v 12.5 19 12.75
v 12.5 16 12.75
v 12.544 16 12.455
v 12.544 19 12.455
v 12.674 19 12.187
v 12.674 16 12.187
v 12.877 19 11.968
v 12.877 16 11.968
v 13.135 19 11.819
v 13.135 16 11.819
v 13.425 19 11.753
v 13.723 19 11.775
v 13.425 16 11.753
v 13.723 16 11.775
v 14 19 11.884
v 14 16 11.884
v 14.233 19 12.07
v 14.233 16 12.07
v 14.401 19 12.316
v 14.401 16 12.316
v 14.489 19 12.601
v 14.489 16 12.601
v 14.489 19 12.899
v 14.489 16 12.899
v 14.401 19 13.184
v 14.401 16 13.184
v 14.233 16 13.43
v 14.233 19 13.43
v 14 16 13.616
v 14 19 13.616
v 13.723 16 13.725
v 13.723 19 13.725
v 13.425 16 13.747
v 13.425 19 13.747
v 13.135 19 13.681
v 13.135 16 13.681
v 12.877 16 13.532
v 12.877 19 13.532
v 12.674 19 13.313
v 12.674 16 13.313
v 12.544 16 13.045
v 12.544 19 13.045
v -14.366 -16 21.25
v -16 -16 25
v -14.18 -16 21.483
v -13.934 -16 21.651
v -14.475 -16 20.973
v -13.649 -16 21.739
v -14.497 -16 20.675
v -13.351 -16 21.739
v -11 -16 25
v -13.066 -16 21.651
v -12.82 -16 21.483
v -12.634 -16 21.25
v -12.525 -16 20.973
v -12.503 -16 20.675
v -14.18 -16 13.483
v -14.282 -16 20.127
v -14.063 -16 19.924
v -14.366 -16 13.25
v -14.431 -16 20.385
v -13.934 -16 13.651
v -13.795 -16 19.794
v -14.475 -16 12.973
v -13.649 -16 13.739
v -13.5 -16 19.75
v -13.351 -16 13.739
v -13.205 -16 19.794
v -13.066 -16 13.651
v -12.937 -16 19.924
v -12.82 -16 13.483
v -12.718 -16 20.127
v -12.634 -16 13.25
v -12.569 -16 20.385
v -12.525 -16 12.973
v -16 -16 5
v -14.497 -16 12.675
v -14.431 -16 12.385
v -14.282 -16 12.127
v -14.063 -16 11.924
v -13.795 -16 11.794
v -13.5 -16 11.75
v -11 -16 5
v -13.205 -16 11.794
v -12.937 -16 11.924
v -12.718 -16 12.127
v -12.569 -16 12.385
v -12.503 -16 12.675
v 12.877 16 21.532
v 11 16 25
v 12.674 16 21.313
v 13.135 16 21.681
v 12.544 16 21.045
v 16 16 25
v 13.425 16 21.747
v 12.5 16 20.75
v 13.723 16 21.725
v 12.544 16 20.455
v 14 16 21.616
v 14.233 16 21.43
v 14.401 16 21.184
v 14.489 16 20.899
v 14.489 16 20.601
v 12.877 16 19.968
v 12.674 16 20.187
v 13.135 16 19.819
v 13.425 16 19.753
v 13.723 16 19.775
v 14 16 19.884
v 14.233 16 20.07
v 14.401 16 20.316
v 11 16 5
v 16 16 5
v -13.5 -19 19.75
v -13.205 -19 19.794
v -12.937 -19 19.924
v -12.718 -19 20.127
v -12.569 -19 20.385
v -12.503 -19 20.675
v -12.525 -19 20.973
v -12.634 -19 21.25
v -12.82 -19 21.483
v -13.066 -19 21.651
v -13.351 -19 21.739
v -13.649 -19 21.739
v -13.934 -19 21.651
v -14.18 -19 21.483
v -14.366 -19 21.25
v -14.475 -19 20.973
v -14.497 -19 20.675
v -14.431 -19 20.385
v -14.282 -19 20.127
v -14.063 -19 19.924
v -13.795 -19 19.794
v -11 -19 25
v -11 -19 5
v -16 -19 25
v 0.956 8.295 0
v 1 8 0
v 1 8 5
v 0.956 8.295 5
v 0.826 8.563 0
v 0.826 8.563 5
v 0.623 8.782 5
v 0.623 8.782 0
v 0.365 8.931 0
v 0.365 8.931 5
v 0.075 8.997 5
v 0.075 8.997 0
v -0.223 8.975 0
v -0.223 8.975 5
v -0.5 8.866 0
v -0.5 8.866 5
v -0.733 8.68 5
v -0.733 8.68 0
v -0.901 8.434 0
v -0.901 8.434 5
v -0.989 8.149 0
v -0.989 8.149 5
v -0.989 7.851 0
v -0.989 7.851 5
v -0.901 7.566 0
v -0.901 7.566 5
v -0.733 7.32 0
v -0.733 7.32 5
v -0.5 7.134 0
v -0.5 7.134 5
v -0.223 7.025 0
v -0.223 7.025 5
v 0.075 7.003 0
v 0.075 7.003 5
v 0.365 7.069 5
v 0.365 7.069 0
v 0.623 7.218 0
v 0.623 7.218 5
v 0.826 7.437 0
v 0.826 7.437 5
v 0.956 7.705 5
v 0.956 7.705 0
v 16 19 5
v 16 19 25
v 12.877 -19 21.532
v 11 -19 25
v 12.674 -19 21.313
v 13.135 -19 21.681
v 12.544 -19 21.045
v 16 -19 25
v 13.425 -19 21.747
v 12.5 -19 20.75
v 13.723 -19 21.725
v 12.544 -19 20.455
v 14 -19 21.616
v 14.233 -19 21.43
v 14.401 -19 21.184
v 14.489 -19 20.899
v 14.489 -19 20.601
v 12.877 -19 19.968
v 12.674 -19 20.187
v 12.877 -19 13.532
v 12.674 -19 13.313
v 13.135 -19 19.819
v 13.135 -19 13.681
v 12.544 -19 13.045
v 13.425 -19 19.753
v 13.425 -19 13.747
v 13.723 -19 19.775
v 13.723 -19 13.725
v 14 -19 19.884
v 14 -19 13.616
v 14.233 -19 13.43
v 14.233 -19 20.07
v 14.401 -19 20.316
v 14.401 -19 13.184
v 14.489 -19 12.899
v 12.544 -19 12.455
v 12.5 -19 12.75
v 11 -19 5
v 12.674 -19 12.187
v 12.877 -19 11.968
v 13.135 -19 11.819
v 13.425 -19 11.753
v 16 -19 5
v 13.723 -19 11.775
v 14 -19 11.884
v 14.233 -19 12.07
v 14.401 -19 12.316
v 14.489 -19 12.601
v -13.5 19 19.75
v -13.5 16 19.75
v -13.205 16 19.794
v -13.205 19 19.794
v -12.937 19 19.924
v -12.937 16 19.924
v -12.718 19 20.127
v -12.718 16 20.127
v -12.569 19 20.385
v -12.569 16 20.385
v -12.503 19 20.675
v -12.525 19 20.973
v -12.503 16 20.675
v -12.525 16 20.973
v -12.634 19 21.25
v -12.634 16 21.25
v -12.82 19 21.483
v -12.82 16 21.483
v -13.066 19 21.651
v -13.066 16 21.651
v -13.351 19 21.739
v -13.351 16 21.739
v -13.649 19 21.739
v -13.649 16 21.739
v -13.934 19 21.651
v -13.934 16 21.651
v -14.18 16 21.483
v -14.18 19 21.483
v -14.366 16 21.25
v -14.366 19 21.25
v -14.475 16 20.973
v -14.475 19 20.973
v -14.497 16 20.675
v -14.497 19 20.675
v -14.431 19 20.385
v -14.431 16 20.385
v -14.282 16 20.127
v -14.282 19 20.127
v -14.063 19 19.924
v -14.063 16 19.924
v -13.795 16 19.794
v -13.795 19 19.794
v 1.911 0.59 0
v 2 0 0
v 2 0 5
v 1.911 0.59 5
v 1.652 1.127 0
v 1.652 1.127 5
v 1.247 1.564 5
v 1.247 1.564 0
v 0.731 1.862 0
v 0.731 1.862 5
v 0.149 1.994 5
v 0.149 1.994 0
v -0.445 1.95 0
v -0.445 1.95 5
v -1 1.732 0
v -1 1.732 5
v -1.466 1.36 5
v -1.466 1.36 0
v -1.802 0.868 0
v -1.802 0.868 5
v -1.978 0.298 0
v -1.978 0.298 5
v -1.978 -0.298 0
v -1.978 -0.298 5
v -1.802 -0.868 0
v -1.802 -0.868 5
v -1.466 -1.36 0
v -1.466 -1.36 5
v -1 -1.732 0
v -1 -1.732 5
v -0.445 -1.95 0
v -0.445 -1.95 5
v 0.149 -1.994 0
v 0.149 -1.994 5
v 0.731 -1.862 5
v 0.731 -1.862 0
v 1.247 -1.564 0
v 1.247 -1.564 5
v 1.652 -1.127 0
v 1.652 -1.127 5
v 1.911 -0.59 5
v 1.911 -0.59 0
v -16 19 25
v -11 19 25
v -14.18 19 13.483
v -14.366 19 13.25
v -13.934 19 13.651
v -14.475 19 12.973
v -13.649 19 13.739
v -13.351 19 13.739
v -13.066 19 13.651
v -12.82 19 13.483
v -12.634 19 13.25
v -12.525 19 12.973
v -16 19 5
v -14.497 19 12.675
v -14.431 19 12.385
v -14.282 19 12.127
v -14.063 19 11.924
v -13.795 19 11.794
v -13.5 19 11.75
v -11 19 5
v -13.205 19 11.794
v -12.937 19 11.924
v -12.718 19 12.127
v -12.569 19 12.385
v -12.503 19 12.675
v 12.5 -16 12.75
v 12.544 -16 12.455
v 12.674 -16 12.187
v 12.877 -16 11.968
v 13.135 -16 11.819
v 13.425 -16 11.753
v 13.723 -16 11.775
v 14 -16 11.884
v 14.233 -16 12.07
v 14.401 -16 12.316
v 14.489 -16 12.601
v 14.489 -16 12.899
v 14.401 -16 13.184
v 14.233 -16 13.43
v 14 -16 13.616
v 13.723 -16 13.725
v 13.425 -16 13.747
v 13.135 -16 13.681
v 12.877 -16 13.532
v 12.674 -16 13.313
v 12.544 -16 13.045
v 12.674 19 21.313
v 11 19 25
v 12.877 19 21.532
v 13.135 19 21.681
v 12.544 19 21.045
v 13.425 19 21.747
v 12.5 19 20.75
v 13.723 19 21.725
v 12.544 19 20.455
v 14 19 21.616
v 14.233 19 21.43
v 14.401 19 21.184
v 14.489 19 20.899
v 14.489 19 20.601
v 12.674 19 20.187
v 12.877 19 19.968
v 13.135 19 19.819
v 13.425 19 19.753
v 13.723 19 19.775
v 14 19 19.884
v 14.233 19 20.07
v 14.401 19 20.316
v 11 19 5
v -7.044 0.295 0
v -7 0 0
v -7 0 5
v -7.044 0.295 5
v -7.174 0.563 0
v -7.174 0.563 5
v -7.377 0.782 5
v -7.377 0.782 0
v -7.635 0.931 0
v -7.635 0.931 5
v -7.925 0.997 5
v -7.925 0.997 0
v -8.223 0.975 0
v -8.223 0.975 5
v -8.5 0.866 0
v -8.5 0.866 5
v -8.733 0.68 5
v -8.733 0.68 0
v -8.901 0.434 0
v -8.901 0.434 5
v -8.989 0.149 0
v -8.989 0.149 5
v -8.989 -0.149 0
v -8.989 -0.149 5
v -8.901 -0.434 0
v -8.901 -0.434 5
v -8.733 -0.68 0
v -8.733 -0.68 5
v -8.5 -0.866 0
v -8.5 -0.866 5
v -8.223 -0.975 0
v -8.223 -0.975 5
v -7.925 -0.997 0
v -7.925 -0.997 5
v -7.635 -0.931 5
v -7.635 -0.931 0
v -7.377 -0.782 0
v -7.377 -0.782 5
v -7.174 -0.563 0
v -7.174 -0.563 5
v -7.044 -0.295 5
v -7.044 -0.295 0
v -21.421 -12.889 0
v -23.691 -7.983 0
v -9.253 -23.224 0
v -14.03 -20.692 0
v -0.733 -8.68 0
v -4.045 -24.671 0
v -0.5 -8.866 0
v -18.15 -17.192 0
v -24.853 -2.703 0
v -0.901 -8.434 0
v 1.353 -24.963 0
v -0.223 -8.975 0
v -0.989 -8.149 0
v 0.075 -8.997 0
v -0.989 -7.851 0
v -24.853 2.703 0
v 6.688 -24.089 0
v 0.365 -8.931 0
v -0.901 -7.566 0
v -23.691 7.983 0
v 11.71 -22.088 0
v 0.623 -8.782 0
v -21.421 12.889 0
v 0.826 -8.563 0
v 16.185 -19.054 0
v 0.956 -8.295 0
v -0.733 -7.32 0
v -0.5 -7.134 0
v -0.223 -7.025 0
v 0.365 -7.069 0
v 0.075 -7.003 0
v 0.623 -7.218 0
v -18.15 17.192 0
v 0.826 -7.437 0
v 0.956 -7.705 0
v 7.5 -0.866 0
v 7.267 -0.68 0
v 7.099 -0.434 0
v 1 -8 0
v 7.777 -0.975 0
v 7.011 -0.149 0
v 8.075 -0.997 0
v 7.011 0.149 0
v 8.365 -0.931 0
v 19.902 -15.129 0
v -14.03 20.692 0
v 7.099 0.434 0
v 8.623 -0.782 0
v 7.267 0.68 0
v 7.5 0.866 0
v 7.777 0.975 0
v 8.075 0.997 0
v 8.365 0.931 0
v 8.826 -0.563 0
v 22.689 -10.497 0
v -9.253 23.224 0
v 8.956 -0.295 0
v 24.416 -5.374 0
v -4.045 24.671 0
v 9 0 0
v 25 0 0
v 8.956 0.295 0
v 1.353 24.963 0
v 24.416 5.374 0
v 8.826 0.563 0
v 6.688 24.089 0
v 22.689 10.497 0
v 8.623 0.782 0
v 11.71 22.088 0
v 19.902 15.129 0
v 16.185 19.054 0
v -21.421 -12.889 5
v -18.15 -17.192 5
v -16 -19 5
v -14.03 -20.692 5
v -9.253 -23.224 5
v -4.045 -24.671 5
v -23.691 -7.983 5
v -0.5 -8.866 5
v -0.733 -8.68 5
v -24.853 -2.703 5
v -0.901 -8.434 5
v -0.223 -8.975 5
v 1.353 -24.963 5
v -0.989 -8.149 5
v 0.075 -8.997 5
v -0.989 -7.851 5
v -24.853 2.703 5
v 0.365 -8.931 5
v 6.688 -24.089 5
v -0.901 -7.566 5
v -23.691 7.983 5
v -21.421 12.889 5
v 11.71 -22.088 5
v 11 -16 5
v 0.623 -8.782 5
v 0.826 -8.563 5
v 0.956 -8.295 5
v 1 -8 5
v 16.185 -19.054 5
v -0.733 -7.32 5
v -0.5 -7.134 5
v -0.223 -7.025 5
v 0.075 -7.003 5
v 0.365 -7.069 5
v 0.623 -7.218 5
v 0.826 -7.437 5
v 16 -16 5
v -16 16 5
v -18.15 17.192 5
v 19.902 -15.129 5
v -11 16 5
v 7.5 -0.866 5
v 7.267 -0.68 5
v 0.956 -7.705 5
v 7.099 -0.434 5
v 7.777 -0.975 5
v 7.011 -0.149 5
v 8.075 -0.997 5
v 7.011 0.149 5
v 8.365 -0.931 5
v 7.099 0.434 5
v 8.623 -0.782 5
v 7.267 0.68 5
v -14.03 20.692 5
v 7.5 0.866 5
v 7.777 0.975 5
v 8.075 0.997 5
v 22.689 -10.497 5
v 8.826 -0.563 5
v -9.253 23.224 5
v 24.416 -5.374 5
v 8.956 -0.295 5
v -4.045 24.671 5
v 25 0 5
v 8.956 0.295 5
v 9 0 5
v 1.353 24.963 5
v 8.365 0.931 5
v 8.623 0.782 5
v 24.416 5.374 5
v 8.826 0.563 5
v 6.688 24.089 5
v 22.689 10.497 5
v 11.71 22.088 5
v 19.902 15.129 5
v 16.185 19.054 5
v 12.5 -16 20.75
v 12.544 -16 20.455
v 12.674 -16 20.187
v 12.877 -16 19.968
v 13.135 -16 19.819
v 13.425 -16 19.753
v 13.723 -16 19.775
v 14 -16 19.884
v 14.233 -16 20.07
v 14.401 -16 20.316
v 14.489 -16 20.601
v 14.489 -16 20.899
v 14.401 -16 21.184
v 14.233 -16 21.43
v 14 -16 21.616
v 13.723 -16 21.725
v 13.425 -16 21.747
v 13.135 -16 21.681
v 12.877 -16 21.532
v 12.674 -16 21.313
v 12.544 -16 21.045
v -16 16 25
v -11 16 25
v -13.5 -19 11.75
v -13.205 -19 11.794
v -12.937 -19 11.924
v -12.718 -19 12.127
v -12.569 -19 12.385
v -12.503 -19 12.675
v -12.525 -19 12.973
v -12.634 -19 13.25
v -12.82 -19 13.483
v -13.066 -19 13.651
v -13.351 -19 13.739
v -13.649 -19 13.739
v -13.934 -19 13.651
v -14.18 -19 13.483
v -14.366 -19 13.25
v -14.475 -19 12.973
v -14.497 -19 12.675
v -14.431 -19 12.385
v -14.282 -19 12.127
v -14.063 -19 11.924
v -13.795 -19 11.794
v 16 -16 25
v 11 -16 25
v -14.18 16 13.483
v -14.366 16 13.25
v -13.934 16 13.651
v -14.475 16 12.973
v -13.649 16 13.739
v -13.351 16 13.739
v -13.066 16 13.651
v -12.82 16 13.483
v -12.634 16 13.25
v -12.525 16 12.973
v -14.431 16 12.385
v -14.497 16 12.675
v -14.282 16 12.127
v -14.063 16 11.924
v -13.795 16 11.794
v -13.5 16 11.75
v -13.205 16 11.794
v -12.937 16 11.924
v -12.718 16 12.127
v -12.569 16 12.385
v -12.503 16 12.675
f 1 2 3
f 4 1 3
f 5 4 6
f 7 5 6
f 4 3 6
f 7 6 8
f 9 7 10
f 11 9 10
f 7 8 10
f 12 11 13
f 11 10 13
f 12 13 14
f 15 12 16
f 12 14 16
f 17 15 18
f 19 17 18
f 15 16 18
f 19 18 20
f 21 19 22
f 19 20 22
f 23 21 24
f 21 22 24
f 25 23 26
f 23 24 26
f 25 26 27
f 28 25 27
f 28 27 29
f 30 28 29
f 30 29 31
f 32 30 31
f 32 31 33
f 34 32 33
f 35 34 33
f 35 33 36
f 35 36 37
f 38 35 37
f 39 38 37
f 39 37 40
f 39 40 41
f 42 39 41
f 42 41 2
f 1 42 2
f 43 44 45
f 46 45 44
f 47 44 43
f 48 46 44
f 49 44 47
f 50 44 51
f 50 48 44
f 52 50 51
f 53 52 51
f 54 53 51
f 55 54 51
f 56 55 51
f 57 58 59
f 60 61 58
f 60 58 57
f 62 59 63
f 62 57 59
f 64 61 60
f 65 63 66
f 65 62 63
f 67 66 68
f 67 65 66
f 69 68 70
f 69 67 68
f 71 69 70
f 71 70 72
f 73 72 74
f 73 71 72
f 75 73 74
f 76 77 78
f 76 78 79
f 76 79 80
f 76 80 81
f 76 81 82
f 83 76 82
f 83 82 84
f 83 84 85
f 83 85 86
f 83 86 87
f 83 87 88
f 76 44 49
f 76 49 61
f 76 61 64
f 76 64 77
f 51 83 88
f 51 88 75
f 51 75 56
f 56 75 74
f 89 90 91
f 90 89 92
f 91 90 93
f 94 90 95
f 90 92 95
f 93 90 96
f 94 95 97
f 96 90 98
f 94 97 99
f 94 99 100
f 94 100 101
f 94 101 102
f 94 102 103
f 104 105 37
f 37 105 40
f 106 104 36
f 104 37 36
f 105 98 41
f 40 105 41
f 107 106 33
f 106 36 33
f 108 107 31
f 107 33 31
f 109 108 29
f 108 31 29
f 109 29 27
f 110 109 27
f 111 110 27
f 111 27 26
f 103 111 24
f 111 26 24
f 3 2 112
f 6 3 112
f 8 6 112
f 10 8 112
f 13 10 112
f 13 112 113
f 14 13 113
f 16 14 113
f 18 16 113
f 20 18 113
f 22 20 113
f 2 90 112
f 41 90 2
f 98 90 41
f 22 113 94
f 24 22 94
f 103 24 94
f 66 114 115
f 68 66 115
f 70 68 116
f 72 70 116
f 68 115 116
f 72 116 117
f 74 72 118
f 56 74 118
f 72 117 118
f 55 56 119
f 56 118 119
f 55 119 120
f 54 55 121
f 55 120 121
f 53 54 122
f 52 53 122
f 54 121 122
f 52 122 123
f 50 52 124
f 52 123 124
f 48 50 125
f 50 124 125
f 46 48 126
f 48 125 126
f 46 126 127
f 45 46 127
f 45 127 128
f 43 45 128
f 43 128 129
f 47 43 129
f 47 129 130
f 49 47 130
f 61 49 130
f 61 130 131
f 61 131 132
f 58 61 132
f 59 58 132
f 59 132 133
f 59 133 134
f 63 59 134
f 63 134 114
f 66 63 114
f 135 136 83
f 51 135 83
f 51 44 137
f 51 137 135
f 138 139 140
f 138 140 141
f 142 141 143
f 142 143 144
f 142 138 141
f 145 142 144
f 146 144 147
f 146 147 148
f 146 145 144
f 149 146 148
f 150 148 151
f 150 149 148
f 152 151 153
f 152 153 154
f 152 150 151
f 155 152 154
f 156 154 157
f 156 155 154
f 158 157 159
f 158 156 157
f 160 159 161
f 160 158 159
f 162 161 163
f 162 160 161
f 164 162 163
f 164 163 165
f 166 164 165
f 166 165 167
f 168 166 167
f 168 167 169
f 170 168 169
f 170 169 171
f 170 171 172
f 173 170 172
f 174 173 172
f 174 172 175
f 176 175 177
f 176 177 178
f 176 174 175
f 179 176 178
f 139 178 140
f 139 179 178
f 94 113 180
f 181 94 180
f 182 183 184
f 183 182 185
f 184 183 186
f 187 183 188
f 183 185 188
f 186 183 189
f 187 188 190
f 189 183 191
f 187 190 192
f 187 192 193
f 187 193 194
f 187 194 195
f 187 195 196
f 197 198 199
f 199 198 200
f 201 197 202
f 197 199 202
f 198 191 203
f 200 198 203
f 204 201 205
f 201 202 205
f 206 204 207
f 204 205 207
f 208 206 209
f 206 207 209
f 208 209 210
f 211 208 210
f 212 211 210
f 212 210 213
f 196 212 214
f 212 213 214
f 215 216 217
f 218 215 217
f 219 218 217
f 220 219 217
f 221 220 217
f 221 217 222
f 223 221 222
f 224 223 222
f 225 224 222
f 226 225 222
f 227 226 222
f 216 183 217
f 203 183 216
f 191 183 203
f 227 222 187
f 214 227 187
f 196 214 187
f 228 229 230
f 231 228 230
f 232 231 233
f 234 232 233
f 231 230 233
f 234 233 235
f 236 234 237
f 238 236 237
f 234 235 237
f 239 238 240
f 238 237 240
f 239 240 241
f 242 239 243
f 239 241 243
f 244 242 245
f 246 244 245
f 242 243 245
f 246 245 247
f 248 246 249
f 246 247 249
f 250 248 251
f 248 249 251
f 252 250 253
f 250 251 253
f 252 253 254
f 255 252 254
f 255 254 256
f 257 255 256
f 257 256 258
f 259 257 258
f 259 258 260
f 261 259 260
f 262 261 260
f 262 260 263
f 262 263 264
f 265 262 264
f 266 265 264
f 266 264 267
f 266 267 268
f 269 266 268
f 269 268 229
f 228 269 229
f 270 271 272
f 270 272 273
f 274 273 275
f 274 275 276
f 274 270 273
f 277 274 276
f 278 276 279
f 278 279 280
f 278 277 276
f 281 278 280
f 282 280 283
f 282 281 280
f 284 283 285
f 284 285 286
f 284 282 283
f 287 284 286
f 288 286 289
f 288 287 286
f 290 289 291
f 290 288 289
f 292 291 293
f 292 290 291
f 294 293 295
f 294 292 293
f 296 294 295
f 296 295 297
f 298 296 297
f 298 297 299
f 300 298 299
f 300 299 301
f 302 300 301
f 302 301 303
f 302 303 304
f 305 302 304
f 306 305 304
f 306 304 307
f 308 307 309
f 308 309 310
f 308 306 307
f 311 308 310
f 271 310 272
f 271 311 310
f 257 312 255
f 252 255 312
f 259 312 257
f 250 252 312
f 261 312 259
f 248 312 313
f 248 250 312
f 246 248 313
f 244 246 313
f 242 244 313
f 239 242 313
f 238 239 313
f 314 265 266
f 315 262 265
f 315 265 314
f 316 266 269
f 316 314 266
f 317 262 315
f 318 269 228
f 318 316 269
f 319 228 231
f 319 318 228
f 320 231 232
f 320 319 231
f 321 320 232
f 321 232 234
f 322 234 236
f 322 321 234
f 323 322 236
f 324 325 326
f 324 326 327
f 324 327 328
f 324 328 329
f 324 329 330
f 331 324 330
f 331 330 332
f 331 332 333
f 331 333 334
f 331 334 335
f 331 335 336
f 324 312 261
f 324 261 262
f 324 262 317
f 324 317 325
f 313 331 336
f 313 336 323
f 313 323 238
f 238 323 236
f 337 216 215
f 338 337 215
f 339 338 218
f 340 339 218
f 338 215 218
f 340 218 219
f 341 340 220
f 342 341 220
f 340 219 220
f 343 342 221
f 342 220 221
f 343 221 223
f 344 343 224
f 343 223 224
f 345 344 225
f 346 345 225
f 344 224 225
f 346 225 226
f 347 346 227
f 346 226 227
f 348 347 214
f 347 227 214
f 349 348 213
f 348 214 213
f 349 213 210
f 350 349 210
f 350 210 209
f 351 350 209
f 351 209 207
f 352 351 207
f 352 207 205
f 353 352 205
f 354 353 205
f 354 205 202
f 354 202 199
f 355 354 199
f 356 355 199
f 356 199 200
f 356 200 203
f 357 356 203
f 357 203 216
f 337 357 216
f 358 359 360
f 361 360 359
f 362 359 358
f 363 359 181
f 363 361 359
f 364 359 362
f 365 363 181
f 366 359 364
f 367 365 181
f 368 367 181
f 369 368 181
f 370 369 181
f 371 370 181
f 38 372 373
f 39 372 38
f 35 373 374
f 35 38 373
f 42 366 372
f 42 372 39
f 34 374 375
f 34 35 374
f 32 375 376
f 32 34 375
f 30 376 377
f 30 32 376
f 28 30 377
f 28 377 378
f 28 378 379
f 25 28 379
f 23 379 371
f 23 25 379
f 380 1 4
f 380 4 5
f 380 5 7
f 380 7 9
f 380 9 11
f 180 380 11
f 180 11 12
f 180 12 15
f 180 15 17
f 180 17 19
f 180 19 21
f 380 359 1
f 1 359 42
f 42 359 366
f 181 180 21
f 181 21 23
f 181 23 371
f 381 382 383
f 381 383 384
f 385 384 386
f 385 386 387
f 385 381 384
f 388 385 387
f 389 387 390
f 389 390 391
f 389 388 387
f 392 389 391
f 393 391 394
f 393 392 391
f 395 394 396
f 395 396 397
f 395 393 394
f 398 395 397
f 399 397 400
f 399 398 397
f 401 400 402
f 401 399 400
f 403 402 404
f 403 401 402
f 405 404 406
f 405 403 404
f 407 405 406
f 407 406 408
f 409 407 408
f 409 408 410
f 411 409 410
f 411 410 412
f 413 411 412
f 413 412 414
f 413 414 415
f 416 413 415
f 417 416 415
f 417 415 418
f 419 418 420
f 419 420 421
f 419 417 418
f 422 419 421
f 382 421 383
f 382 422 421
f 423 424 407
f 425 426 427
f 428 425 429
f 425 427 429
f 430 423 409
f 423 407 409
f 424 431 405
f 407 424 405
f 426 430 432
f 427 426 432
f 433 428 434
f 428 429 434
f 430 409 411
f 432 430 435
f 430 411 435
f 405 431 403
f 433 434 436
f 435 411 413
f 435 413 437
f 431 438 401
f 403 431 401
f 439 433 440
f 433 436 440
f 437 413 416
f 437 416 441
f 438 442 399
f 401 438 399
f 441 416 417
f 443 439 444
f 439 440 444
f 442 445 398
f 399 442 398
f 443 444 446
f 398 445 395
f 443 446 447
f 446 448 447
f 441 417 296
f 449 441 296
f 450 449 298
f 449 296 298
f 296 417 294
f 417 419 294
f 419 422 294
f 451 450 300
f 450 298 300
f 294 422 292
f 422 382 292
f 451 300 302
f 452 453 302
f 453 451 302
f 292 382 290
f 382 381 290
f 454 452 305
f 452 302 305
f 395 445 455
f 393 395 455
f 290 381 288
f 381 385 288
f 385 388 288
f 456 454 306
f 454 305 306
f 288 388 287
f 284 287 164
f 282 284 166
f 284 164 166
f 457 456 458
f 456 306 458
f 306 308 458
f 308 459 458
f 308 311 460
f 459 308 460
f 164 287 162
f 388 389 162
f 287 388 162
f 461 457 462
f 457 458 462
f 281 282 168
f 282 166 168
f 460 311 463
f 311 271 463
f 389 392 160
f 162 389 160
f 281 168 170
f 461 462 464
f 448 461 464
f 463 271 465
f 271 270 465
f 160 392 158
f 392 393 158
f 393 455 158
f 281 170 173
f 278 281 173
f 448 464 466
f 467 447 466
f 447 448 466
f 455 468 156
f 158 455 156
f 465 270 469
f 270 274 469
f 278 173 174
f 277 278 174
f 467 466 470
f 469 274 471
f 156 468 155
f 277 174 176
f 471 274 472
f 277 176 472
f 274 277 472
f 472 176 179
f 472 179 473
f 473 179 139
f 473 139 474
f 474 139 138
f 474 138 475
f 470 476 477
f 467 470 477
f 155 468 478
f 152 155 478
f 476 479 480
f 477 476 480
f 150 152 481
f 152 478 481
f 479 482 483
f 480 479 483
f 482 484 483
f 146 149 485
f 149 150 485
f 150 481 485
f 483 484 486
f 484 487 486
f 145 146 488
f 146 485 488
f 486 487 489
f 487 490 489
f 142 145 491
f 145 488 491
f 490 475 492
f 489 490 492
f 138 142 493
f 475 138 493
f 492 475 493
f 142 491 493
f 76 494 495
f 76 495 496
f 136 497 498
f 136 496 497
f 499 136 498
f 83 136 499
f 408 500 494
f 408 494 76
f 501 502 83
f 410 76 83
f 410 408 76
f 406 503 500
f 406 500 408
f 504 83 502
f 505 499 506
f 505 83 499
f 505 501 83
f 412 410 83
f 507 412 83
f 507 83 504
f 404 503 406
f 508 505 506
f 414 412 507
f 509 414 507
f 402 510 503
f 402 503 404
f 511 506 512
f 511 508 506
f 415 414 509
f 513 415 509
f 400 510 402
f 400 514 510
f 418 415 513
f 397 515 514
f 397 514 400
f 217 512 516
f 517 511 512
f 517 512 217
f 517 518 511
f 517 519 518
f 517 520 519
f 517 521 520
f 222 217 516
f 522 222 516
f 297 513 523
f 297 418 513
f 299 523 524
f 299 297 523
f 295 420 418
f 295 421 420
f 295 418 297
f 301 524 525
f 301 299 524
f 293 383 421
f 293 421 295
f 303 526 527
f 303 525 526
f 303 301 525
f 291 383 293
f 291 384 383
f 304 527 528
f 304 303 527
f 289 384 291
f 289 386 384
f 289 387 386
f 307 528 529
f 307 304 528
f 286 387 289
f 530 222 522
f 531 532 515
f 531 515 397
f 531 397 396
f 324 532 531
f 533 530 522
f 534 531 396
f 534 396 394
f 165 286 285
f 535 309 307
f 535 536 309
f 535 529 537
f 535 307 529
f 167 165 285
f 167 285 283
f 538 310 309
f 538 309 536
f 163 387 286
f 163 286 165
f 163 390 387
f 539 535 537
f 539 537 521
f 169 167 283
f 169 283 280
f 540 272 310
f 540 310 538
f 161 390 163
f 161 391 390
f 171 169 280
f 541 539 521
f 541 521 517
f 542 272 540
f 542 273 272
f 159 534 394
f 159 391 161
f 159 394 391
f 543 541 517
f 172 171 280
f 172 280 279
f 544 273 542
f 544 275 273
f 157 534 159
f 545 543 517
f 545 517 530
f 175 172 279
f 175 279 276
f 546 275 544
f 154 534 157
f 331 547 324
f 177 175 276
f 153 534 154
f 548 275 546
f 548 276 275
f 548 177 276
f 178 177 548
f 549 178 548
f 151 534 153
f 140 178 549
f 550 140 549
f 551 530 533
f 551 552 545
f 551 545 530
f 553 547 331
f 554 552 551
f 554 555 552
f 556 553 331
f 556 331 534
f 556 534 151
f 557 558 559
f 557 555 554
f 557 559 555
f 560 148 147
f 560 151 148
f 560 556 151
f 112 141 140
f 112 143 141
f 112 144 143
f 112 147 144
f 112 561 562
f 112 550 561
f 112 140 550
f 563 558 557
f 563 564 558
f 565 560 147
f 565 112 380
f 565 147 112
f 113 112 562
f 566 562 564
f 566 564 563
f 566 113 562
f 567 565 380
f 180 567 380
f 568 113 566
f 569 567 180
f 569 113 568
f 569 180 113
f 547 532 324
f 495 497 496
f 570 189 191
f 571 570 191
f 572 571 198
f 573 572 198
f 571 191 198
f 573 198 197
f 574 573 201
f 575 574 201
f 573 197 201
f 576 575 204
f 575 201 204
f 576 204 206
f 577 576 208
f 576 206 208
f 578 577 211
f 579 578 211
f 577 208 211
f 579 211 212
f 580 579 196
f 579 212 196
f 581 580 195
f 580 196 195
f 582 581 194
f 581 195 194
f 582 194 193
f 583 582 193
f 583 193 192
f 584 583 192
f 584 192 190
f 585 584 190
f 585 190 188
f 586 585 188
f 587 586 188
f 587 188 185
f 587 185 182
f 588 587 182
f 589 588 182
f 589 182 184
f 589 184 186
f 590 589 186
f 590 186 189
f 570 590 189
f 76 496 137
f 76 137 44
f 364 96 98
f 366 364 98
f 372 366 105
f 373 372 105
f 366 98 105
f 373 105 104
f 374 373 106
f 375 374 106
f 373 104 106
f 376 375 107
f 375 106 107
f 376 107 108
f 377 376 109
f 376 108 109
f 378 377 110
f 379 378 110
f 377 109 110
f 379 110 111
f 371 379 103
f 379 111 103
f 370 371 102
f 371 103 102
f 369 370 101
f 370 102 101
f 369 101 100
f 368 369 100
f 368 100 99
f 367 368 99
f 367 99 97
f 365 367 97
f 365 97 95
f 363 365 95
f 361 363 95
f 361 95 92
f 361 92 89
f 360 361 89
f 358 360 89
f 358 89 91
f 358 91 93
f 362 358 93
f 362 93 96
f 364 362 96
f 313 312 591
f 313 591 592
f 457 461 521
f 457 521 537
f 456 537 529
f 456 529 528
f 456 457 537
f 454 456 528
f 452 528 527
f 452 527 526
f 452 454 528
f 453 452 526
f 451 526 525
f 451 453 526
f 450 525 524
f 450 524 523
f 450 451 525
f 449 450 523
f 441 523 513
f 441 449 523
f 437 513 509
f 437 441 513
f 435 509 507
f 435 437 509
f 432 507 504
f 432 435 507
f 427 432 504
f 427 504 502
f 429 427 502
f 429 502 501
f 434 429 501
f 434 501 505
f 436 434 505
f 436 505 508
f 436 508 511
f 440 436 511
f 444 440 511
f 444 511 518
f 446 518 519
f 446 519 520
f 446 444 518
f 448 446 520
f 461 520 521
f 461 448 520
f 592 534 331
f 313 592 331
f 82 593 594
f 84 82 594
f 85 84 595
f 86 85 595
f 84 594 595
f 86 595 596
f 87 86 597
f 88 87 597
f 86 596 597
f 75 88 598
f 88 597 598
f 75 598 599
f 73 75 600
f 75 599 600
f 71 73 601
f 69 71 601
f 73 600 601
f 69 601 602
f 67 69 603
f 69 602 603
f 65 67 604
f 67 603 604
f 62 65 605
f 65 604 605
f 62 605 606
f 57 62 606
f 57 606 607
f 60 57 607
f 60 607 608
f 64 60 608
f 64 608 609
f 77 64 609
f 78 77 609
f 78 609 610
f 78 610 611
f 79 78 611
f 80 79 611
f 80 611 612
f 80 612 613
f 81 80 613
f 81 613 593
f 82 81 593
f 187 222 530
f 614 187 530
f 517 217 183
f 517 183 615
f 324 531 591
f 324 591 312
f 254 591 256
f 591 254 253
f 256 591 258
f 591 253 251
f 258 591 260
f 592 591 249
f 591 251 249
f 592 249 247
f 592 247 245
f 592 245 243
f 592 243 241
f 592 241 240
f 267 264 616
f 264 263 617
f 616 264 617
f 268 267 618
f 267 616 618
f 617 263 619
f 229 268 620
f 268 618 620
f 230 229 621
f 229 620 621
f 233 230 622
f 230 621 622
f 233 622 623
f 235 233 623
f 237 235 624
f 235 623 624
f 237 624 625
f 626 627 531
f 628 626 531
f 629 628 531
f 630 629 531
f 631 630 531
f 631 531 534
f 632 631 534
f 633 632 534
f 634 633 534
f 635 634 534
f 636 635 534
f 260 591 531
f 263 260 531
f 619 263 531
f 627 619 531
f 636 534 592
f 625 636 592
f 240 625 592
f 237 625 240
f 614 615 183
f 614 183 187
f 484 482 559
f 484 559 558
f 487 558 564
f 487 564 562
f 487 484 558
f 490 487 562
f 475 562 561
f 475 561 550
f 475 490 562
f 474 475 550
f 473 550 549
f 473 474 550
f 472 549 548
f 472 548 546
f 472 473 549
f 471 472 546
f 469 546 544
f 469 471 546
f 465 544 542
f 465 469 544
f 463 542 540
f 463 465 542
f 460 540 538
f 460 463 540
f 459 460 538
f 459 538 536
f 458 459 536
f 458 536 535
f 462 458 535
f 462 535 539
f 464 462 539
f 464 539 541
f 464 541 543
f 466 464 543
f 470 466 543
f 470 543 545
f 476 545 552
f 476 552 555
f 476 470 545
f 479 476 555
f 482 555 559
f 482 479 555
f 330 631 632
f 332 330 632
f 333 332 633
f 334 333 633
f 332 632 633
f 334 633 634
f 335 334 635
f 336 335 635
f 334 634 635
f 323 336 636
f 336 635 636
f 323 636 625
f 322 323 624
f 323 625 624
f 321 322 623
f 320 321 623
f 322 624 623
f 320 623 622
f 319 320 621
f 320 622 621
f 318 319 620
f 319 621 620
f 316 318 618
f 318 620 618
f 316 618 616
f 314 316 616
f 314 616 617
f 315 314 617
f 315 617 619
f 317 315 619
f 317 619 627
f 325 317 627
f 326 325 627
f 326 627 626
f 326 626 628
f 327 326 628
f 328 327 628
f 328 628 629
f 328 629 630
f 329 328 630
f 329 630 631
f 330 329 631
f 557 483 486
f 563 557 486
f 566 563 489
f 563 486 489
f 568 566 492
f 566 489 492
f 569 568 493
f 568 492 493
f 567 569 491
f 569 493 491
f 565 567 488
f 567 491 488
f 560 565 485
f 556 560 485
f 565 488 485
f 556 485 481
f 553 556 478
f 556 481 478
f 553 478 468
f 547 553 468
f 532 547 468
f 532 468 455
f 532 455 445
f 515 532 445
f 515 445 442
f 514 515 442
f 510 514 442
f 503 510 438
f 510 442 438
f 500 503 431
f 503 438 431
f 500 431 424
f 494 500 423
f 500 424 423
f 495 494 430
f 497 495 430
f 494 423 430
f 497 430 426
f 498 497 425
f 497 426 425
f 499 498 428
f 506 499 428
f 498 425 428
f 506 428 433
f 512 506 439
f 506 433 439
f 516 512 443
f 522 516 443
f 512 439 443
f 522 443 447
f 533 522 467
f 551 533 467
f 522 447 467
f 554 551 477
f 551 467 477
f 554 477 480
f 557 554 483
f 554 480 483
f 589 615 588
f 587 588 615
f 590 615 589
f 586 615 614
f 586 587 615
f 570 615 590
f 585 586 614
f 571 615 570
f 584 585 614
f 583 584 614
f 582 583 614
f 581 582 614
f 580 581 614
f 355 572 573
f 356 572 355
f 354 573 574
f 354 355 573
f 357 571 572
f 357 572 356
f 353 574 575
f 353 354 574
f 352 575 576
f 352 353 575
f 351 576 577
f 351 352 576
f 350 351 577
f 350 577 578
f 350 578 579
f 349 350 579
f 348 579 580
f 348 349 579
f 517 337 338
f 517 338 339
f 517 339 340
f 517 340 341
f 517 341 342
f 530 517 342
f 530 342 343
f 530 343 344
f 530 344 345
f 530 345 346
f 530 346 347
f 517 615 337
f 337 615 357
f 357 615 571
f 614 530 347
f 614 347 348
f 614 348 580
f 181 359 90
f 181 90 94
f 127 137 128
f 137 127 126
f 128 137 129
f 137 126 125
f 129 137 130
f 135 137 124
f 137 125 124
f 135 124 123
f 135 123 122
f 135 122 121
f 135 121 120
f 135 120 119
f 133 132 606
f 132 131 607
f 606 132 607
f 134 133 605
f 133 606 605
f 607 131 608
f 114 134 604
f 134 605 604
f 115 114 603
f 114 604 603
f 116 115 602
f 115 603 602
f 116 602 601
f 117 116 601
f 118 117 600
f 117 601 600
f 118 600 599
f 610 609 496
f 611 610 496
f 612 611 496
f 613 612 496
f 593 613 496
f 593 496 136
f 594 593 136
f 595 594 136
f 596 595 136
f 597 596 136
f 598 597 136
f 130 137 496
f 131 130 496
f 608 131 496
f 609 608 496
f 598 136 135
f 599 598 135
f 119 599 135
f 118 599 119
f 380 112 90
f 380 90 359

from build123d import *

# Parameters (mm, degrees)
SKETCH1_R           = 25
SKETCH1_R_2         = 1
SKETCH1_R_3         = 2
BOSS_EXTRUDE1_DEPTH = 5
SKETCH2_W           = 5
SKETCH2_H           = 3
BOSS_EXTRUDE2_DEPTH = 20
SKETCH3_R           = 1
CUT_EXTRUDE1_DEPTH  = 57.444663167


with BuildPart() as part:
    # Sketch1 → Boss-Extrude1 (new body)
    with BuildSketch(Plane.XY):
        Circle(SKETCH1_R)
        with Locations((0, 8)):
            Circle(SKETCH1_R_2, mode=Mode.SUBTRACT)
        with Locations((8, 0)):
            Circle(SKETCH1_R_2, mode=Mode.SUBTRACT)
        with Locations((0, -8)):
            Circle(SKETCH1_R_2, mode=Mode.SUBTRACT)
        with Locations((-8, 0)):
            Circle(SKETCH1_R_2, mode=Mode.SUBTRACT)
        Circle(SKETCH1_R_3, mode=Mode.SUBTRACT)
    extrude(amount=BOSS_EXTRUDE1_DEPTH)

    # Sketch2 → Boss-Extrude2 (add)
    with BuildSketch(Plane.XY.offset(5)):
        with Locations((-13.5, 17.5)):
            Rectangle(SKETCH2_W, SKETCH2_H)
        with Locations((13.5, 17.5)):
            Rectangle(SKETCH2_W, SKETCH2_H)
        with Locations((-13.5, -17.5)):
            Rectangle(SKETCH2_W, SKETCH2_H)
        with Locations((13.5, -17.5)):
            Rectangle(SKETCH2_W, SKETCH2_H)
    extrude(amount=BOSS_EXTRUDE2_DEPTH)

    # Sketch3 → Cut-Extrude1 (cut, through all)
    with BuildSketch(Plane.XZ.offset(19)):
        with Locations(Location((-13.5, 20.75, 0), (0, 0, 270))):
            Circle(SKETCH3_R)
        with Locations(Location((-13.5, 12.75, 0), (0, 0, 270))):
            Circle(SKETCH3_R)
        with Locations(Location((13.5, 20.75, 0), (0, 0, 180))):
            Circle(SKETCH3_R)
        with Locations(Location((13.5, 12.75, 0), (0, 0, 180))):
            Circle(SKETCH3_R)
    extrude(amount=-CUT_EXTRUDE1_DEPTH, mode=Mode.SUBTRACT)


solid = part.part
